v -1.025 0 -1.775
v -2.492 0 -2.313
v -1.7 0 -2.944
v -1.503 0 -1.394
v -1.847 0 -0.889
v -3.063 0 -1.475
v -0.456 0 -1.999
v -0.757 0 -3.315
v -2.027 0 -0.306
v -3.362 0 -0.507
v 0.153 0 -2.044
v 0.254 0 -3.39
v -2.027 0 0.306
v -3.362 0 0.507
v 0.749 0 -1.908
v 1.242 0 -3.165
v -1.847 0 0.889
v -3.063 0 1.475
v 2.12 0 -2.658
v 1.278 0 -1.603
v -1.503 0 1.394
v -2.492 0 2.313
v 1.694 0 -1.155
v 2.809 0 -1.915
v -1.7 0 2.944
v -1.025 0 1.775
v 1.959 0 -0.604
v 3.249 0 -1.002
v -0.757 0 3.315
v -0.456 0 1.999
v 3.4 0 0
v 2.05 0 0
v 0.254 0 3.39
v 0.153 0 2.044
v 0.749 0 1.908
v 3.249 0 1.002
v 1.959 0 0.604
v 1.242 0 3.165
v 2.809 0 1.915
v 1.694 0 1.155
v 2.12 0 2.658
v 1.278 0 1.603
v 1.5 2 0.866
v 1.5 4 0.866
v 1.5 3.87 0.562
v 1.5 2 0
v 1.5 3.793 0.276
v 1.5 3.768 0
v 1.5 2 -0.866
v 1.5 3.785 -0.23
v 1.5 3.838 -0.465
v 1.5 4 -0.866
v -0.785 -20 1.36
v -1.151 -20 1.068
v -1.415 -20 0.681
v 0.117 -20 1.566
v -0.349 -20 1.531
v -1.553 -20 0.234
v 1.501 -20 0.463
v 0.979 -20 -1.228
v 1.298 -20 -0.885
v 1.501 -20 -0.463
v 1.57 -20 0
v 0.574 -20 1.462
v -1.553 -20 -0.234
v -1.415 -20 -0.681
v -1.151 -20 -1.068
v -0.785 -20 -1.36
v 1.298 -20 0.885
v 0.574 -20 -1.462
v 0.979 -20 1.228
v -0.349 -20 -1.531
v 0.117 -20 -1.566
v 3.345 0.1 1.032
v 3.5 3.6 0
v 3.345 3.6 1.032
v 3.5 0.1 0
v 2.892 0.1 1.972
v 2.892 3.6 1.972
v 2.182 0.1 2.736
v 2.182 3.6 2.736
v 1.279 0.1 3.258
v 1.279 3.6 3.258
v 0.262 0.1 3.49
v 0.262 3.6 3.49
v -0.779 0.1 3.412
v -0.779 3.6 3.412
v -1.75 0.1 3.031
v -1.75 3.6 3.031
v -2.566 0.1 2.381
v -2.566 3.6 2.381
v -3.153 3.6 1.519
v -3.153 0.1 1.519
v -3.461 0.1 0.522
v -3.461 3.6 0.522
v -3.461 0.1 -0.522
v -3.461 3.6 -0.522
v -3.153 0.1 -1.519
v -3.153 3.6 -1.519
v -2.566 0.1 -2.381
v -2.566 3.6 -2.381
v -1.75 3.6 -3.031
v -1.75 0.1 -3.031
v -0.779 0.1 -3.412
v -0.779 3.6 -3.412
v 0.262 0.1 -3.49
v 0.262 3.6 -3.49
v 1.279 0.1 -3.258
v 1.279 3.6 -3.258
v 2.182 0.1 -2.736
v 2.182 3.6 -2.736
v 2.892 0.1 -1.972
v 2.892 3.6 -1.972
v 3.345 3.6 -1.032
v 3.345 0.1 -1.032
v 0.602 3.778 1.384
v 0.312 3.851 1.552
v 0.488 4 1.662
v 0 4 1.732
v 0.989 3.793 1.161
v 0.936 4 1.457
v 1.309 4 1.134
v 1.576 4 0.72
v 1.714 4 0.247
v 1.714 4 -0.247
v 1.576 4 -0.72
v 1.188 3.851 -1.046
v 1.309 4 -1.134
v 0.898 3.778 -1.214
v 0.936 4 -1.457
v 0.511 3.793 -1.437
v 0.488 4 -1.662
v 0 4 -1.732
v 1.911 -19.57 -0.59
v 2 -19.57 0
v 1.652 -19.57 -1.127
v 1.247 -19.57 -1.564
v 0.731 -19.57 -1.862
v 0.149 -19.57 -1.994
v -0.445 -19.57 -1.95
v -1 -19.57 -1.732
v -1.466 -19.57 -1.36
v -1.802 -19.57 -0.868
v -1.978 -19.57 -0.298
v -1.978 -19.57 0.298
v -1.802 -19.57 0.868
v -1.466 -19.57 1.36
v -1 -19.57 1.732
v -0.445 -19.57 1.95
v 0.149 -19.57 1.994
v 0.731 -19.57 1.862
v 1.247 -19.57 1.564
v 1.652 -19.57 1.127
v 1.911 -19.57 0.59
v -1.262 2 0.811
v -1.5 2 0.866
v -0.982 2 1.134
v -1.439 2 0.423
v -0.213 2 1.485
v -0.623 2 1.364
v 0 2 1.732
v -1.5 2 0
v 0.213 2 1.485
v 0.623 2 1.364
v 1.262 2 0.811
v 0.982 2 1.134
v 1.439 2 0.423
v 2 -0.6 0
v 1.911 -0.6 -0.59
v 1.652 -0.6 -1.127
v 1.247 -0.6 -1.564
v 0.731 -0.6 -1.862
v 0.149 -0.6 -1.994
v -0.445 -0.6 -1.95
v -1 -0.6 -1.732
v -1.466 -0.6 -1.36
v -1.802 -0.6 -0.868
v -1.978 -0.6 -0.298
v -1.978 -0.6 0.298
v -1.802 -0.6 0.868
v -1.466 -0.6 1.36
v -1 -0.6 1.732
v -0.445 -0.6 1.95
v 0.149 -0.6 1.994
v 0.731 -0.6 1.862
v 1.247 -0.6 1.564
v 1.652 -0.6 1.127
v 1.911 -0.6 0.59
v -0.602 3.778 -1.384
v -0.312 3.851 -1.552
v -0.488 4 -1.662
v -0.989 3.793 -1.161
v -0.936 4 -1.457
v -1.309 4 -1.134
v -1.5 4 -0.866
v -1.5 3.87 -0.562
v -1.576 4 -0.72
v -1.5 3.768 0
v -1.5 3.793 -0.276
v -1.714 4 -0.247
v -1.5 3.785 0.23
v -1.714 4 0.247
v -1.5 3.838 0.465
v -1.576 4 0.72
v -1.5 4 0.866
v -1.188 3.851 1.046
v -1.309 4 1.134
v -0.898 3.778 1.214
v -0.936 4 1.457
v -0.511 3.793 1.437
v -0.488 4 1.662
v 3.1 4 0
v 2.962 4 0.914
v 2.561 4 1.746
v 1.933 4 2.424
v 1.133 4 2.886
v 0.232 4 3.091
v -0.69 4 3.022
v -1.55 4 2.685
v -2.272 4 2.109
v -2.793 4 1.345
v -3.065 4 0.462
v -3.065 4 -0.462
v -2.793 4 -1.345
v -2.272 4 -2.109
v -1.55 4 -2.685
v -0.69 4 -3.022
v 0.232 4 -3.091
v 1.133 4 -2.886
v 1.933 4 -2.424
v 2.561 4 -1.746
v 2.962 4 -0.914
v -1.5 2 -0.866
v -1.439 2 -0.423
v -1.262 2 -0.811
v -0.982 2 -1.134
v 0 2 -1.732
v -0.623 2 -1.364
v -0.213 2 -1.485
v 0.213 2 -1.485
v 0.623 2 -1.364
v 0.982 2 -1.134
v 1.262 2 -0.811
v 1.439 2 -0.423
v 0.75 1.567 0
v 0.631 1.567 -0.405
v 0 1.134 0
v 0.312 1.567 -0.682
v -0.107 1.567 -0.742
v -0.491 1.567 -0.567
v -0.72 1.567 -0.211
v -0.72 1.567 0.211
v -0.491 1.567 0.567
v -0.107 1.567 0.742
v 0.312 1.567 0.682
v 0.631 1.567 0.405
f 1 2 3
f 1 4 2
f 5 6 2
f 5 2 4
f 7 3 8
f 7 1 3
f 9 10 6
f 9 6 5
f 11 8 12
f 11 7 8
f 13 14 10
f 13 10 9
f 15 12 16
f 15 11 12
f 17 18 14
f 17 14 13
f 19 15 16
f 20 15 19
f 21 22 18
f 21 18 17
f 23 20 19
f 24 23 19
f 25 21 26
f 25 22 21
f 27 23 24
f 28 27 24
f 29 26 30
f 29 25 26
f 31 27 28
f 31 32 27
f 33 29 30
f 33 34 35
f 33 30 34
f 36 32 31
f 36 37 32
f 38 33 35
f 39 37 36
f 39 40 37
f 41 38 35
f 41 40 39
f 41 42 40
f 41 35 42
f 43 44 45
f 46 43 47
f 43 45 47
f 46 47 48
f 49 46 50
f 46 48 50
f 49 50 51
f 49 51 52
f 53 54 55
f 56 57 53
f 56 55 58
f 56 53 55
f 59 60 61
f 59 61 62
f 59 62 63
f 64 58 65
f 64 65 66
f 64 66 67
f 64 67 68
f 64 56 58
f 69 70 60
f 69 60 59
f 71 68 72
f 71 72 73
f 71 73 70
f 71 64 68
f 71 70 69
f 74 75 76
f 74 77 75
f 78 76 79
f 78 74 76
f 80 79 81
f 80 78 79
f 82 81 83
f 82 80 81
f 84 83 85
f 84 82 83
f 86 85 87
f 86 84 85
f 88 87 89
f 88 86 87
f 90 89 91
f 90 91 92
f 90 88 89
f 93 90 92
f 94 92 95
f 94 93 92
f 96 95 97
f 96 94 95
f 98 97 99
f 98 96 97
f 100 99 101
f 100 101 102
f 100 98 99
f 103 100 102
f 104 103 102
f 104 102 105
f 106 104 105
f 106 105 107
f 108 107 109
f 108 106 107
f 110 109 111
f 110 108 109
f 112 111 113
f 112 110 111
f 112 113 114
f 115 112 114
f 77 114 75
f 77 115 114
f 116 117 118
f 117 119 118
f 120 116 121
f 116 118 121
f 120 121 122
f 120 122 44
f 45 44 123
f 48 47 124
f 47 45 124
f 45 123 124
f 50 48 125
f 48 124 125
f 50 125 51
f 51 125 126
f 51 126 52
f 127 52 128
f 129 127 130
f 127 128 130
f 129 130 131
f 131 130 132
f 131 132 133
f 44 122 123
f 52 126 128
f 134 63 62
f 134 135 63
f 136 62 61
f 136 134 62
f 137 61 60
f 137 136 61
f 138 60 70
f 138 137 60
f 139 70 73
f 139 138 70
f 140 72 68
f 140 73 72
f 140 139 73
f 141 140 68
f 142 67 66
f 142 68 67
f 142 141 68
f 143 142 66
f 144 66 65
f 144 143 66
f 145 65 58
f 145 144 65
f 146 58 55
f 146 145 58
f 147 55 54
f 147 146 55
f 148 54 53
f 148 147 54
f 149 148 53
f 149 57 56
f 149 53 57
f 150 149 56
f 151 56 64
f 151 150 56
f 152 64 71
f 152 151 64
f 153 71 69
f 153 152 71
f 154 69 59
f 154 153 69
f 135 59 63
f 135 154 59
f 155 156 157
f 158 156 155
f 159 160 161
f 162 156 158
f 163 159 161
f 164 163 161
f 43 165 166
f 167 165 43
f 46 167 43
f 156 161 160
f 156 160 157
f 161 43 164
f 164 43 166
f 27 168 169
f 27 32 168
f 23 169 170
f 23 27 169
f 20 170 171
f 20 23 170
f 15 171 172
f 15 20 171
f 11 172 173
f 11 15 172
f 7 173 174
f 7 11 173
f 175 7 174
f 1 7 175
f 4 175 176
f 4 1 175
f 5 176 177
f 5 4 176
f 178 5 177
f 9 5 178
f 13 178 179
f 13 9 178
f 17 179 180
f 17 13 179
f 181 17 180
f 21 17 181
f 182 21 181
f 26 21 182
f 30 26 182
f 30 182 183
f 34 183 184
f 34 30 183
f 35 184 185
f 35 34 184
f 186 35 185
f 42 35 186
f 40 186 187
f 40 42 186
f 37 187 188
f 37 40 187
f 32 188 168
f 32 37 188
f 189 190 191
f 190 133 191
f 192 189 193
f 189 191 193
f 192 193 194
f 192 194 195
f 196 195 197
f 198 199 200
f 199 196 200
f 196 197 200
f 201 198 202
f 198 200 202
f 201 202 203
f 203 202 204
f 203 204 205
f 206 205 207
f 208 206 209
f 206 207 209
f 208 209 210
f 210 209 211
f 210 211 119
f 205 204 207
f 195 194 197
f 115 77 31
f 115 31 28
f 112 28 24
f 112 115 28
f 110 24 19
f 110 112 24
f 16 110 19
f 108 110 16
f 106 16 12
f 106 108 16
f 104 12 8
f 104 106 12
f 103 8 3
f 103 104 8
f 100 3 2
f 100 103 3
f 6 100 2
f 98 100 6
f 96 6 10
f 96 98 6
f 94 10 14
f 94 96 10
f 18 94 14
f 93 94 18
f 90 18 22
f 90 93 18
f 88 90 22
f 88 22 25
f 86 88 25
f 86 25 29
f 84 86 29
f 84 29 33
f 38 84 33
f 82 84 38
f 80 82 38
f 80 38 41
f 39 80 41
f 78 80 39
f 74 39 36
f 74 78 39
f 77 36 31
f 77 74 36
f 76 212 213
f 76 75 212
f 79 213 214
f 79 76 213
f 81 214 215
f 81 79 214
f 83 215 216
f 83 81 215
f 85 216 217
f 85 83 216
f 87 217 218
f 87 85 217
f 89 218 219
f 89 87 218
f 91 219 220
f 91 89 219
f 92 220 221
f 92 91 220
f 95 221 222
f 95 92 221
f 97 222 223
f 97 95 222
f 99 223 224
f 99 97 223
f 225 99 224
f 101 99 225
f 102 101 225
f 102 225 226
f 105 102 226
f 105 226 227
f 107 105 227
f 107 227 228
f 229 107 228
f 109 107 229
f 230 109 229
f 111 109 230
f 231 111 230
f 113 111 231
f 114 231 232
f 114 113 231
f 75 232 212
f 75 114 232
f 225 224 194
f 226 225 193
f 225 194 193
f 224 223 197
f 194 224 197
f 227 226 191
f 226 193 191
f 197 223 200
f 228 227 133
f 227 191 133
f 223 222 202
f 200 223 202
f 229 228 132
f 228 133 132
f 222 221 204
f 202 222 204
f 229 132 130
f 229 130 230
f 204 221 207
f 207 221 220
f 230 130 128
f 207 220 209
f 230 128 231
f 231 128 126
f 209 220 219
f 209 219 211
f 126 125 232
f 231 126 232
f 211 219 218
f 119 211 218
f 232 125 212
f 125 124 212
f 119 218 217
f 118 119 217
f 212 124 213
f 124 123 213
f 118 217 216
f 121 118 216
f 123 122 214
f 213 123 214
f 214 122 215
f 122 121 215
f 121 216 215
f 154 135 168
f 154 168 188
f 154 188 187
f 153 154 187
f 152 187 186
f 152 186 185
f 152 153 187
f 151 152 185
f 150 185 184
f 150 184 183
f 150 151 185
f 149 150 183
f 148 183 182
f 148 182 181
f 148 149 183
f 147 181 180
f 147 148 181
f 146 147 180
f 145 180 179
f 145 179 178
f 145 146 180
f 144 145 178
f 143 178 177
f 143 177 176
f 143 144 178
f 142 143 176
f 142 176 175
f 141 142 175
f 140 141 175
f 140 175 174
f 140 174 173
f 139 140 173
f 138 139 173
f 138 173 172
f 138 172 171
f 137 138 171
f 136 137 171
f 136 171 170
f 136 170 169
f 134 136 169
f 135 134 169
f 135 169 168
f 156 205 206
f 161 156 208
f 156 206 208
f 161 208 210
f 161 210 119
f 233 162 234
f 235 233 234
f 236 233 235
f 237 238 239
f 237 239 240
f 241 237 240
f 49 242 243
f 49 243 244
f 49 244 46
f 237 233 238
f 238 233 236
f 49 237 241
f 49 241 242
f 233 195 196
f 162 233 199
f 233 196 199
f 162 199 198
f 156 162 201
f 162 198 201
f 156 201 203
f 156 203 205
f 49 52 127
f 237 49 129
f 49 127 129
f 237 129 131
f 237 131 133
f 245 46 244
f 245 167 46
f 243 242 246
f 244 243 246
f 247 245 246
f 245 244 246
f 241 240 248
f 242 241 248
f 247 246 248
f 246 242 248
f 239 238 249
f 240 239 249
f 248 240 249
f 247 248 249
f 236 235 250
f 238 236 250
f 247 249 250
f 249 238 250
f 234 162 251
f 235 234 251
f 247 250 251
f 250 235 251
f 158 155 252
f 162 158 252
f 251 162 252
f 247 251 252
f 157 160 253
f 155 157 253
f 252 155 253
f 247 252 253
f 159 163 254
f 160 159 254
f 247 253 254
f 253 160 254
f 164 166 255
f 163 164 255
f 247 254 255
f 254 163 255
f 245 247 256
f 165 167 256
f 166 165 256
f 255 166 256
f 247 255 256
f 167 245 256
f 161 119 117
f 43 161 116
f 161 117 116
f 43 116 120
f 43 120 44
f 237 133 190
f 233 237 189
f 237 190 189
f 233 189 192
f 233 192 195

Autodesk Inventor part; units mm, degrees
sketch "Sketch_1" plane through (0, 0, 0) normal (0, 0, 1) x (1, 0, 0)
  line L0 (0, -20) -> (0, 4)
  line L1 (0, 1.134) -> (1.5, 2)
  line L2 (1.5, 2) -> (1.5, 3.7679)
  line L3 (1.5, 3.7679) -> (1.7321, 4)
  line L4 (1.7321, 4) -> (3.1, 4)
  line L5 (3.1, 4) -> (3.5, 3.6)
  line L6 (3.5, 3.6) -> (3.5, 0.1)
  line L7 (3.5, 0.1) -> (3.4, 0)
  line L8 (3.4, 0) -> (2.05, 0)
  line L9 (2.05, 0) -> (2, -0.6)
  line L10 (2, -0.6) -> (2, -19.5705)
  line L11 (2, -19.5705) -> (1.5705, -20)
  line L12 (1.5705, -20) -> (0, -20)
  line L13 (0, -20) -> (0, 1.134)
revolve "Revolution1" add sketch "Sketch_1" angle 360 about axis through (0, -20, 0) along (0, -1, 0)
thread "Thread1" size "M4x0.7" class "6g" standard "ISO Metric profile" length 17.4705
sketch "Sketch_2" plane through (0, 4, 0) normal (0, 1, 0) x (1, 0, 0)
  line L0 (-1.5, -0.866) -> (0, -1.7321)
  line L1 (0, -1.7321) -> (1.5, -0.866)
  line L2 (1.5, -0.866) -> (1.5, 0.866)
  line L3 (1.5, 0.866) -> (0, 1.7321)
  line L4 (0, 1.7321) -> (-1.5, 0.866)
  line L5 (-1.5, 0.866) -> (-1.5, -0.866)
extrude "Extrusion1" cut sketch "Sketch_2" against normal blind 2
ref_plane "ANBAU_XY" through (0, 0, 0) normal (0, 1, 0) x (1, 0, 0)
ref_plane "ANBAU_YZ" through (0, 0, 0) normal (1, 0, 0) x (0, 0, -1)
ref_plane "ANBAU_ZX" through (0, 0, 0) normal (0, 0, -1) x (0, 1, 0)
ref_plane "Schraube_XY" through (0, 0, 0) normal (0, 1, 0) x (1, 0, 0)
ref_plane "Schraube_YZ" through (0, 0, 0) normal (1, 0, 0) x (0, 0, -1)
ref_plane "Schraube_ZX" through (0, 0, 0) normal (0, 0, -1) x (0, 1, 0)
ref_plane "insert_XY" through (0, 0, 0) normal (0, 1, 0) x (1, 0, 0)
ref_plane "insert_YZ" through (0, 0, 0) normal (1, 0, 0) x (0, 0, -1)
ref_plane "insert_ZX" through (0, 0, 0) normal (0, 0, -1) x (0, 1, 0)
ref_plane "schrauben_punkt_XY" through (0, -20, 0) normal (0, 1, 0) x (1, 0, 0)
ref_plane "schrauben_punkt_YZ" through (0, -20, 0) normal (1, 0, 0) x (0, 0, -1)
ref_plane "schrauben_punkt_ZX" through (0, -20, 0) normal (0, 0, -1) x (0, 1, 0)
properties part number "DIN-912 - M4x20(F)"
